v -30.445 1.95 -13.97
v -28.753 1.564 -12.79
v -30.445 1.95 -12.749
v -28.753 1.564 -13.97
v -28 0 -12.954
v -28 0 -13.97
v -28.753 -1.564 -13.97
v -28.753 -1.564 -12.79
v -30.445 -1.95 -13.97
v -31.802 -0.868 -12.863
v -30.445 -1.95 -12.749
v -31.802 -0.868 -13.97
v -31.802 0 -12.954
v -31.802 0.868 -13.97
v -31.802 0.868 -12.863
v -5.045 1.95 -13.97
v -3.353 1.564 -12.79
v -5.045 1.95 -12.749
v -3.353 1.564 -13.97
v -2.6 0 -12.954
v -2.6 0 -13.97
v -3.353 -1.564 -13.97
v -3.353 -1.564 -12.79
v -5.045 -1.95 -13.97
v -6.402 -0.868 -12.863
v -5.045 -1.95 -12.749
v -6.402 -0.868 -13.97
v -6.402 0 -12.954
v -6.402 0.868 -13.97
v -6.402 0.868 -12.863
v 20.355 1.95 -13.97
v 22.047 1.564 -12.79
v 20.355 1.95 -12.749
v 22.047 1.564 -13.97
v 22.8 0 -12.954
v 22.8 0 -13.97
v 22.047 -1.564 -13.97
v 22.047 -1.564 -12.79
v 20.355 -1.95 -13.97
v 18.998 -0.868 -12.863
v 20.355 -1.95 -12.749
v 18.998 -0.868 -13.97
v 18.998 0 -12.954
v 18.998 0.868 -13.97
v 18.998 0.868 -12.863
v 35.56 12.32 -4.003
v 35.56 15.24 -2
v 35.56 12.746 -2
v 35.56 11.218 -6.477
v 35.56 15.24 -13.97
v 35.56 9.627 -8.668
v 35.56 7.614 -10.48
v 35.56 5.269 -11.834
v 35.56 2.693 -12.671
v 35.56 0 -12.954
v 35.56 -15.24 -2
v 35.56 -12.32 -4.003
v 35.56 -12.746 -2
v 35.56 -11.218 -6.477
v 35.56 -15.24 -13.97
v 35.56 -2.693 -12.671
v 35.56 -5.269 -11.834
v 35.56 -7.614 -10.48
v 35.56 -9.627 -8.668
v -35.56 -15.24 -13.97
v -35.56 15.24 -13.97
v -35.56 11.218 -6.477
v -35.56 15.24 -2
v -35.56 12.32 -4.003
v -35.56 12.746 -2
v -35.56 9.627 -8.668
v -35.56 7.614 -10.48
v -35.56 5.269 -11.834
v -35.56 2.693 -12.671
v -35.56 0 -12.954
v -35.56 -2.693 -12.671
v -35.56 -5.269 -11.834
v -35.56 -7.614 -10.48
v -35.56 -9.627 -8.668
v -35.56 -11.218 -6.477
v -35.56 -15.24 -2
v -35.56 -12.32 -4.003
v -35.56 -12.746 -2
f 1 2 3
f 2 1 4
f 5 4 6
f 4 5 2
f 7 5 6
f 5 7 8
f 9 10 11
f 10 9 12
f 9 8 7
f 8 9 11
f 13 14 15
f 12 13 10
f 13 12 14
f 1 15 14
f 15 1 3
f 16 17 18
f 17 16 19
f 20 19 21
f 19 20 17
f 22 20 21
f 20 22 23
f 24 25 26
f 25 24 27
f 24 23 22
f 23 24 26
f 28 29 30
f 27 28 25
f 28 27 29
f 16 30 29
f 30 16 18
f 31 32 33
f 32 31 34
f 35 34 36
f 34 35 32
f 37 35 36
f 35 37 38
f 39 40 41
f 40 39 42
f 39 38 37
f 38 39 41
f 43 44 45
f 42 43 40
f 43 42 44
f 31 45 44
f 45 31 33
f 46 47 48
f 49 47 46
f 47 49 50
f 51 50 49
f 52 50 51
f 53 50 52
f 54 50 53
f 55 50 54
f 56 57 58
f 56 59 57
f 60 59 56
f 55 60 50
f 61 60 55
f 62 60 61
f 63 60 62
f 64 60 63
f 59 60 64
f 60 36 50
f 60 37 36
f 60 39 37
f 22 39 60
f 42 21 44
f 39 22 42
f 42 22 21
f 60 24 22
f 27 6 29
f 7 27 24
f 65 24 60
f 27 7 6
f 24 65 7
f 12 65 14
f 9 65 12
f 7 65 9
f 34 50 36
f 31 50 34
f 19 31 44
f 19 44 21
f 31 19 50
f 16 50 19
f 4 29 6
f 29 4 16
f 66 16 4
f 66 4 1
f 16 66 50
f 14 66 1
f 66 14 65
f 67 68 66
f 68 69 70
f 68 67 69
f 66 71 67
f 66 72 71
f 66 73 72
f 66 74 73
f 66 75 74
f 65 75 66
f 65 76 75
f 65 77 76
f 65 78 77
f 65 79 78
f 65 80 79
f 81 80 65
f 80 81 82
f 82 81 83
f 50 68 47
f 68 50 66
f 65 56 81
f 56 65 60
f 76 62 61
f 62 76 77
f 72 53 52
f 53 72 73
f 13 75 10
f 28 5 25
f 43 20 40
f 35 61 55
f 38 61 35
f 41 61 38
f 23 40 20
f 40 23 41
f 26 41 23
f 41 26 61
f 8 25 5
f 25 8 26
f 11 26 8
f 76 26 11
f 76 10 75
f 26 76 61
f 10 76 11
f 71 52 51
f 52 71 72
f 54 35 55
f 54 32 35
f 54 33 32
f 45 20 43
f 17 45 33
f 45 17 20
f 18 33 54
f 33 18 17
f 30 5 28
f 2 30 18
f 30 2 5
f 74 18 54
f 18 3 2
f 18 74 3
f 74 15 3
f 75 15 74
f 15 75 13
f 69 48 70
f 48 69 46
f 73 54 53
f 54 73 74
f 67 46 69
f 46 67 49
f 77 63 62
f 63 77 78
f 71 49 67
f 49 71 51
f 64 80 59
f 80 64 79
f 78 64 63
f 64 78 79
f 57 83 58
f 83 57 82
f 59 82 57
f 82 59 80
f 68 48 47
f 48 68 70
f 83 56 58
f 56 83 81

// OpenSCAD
inch = 25.4;

module tongue_adapter() {
     difference() {
          cube([2.8*inch, 1.2*inch, 1.1*inch], center=true);

          rotate([0, 90, 0]) cylinder(r=1.02*inch/2, h=100, center=true);

          translate([0, 0, 40-2]) cube([100, 100, 80], center=true);

          translate([-30, 0, 0])
               #for (i = [0:2])
               translate([i*inch, 0, 0]) cylinder(r=4/2, h=30, center=true);
     }
}

module spacer() {
     difference() {
          cube([4*25, 25, 0.075*inch]);
          translate([25/2, 25/2, 0])
               for (i = [0:25:75])
               translate([i, 0, 0]) cylinder(r=6.5/2, h=30, center=true);

     }
}

//spacer();
tongue_adapter();
